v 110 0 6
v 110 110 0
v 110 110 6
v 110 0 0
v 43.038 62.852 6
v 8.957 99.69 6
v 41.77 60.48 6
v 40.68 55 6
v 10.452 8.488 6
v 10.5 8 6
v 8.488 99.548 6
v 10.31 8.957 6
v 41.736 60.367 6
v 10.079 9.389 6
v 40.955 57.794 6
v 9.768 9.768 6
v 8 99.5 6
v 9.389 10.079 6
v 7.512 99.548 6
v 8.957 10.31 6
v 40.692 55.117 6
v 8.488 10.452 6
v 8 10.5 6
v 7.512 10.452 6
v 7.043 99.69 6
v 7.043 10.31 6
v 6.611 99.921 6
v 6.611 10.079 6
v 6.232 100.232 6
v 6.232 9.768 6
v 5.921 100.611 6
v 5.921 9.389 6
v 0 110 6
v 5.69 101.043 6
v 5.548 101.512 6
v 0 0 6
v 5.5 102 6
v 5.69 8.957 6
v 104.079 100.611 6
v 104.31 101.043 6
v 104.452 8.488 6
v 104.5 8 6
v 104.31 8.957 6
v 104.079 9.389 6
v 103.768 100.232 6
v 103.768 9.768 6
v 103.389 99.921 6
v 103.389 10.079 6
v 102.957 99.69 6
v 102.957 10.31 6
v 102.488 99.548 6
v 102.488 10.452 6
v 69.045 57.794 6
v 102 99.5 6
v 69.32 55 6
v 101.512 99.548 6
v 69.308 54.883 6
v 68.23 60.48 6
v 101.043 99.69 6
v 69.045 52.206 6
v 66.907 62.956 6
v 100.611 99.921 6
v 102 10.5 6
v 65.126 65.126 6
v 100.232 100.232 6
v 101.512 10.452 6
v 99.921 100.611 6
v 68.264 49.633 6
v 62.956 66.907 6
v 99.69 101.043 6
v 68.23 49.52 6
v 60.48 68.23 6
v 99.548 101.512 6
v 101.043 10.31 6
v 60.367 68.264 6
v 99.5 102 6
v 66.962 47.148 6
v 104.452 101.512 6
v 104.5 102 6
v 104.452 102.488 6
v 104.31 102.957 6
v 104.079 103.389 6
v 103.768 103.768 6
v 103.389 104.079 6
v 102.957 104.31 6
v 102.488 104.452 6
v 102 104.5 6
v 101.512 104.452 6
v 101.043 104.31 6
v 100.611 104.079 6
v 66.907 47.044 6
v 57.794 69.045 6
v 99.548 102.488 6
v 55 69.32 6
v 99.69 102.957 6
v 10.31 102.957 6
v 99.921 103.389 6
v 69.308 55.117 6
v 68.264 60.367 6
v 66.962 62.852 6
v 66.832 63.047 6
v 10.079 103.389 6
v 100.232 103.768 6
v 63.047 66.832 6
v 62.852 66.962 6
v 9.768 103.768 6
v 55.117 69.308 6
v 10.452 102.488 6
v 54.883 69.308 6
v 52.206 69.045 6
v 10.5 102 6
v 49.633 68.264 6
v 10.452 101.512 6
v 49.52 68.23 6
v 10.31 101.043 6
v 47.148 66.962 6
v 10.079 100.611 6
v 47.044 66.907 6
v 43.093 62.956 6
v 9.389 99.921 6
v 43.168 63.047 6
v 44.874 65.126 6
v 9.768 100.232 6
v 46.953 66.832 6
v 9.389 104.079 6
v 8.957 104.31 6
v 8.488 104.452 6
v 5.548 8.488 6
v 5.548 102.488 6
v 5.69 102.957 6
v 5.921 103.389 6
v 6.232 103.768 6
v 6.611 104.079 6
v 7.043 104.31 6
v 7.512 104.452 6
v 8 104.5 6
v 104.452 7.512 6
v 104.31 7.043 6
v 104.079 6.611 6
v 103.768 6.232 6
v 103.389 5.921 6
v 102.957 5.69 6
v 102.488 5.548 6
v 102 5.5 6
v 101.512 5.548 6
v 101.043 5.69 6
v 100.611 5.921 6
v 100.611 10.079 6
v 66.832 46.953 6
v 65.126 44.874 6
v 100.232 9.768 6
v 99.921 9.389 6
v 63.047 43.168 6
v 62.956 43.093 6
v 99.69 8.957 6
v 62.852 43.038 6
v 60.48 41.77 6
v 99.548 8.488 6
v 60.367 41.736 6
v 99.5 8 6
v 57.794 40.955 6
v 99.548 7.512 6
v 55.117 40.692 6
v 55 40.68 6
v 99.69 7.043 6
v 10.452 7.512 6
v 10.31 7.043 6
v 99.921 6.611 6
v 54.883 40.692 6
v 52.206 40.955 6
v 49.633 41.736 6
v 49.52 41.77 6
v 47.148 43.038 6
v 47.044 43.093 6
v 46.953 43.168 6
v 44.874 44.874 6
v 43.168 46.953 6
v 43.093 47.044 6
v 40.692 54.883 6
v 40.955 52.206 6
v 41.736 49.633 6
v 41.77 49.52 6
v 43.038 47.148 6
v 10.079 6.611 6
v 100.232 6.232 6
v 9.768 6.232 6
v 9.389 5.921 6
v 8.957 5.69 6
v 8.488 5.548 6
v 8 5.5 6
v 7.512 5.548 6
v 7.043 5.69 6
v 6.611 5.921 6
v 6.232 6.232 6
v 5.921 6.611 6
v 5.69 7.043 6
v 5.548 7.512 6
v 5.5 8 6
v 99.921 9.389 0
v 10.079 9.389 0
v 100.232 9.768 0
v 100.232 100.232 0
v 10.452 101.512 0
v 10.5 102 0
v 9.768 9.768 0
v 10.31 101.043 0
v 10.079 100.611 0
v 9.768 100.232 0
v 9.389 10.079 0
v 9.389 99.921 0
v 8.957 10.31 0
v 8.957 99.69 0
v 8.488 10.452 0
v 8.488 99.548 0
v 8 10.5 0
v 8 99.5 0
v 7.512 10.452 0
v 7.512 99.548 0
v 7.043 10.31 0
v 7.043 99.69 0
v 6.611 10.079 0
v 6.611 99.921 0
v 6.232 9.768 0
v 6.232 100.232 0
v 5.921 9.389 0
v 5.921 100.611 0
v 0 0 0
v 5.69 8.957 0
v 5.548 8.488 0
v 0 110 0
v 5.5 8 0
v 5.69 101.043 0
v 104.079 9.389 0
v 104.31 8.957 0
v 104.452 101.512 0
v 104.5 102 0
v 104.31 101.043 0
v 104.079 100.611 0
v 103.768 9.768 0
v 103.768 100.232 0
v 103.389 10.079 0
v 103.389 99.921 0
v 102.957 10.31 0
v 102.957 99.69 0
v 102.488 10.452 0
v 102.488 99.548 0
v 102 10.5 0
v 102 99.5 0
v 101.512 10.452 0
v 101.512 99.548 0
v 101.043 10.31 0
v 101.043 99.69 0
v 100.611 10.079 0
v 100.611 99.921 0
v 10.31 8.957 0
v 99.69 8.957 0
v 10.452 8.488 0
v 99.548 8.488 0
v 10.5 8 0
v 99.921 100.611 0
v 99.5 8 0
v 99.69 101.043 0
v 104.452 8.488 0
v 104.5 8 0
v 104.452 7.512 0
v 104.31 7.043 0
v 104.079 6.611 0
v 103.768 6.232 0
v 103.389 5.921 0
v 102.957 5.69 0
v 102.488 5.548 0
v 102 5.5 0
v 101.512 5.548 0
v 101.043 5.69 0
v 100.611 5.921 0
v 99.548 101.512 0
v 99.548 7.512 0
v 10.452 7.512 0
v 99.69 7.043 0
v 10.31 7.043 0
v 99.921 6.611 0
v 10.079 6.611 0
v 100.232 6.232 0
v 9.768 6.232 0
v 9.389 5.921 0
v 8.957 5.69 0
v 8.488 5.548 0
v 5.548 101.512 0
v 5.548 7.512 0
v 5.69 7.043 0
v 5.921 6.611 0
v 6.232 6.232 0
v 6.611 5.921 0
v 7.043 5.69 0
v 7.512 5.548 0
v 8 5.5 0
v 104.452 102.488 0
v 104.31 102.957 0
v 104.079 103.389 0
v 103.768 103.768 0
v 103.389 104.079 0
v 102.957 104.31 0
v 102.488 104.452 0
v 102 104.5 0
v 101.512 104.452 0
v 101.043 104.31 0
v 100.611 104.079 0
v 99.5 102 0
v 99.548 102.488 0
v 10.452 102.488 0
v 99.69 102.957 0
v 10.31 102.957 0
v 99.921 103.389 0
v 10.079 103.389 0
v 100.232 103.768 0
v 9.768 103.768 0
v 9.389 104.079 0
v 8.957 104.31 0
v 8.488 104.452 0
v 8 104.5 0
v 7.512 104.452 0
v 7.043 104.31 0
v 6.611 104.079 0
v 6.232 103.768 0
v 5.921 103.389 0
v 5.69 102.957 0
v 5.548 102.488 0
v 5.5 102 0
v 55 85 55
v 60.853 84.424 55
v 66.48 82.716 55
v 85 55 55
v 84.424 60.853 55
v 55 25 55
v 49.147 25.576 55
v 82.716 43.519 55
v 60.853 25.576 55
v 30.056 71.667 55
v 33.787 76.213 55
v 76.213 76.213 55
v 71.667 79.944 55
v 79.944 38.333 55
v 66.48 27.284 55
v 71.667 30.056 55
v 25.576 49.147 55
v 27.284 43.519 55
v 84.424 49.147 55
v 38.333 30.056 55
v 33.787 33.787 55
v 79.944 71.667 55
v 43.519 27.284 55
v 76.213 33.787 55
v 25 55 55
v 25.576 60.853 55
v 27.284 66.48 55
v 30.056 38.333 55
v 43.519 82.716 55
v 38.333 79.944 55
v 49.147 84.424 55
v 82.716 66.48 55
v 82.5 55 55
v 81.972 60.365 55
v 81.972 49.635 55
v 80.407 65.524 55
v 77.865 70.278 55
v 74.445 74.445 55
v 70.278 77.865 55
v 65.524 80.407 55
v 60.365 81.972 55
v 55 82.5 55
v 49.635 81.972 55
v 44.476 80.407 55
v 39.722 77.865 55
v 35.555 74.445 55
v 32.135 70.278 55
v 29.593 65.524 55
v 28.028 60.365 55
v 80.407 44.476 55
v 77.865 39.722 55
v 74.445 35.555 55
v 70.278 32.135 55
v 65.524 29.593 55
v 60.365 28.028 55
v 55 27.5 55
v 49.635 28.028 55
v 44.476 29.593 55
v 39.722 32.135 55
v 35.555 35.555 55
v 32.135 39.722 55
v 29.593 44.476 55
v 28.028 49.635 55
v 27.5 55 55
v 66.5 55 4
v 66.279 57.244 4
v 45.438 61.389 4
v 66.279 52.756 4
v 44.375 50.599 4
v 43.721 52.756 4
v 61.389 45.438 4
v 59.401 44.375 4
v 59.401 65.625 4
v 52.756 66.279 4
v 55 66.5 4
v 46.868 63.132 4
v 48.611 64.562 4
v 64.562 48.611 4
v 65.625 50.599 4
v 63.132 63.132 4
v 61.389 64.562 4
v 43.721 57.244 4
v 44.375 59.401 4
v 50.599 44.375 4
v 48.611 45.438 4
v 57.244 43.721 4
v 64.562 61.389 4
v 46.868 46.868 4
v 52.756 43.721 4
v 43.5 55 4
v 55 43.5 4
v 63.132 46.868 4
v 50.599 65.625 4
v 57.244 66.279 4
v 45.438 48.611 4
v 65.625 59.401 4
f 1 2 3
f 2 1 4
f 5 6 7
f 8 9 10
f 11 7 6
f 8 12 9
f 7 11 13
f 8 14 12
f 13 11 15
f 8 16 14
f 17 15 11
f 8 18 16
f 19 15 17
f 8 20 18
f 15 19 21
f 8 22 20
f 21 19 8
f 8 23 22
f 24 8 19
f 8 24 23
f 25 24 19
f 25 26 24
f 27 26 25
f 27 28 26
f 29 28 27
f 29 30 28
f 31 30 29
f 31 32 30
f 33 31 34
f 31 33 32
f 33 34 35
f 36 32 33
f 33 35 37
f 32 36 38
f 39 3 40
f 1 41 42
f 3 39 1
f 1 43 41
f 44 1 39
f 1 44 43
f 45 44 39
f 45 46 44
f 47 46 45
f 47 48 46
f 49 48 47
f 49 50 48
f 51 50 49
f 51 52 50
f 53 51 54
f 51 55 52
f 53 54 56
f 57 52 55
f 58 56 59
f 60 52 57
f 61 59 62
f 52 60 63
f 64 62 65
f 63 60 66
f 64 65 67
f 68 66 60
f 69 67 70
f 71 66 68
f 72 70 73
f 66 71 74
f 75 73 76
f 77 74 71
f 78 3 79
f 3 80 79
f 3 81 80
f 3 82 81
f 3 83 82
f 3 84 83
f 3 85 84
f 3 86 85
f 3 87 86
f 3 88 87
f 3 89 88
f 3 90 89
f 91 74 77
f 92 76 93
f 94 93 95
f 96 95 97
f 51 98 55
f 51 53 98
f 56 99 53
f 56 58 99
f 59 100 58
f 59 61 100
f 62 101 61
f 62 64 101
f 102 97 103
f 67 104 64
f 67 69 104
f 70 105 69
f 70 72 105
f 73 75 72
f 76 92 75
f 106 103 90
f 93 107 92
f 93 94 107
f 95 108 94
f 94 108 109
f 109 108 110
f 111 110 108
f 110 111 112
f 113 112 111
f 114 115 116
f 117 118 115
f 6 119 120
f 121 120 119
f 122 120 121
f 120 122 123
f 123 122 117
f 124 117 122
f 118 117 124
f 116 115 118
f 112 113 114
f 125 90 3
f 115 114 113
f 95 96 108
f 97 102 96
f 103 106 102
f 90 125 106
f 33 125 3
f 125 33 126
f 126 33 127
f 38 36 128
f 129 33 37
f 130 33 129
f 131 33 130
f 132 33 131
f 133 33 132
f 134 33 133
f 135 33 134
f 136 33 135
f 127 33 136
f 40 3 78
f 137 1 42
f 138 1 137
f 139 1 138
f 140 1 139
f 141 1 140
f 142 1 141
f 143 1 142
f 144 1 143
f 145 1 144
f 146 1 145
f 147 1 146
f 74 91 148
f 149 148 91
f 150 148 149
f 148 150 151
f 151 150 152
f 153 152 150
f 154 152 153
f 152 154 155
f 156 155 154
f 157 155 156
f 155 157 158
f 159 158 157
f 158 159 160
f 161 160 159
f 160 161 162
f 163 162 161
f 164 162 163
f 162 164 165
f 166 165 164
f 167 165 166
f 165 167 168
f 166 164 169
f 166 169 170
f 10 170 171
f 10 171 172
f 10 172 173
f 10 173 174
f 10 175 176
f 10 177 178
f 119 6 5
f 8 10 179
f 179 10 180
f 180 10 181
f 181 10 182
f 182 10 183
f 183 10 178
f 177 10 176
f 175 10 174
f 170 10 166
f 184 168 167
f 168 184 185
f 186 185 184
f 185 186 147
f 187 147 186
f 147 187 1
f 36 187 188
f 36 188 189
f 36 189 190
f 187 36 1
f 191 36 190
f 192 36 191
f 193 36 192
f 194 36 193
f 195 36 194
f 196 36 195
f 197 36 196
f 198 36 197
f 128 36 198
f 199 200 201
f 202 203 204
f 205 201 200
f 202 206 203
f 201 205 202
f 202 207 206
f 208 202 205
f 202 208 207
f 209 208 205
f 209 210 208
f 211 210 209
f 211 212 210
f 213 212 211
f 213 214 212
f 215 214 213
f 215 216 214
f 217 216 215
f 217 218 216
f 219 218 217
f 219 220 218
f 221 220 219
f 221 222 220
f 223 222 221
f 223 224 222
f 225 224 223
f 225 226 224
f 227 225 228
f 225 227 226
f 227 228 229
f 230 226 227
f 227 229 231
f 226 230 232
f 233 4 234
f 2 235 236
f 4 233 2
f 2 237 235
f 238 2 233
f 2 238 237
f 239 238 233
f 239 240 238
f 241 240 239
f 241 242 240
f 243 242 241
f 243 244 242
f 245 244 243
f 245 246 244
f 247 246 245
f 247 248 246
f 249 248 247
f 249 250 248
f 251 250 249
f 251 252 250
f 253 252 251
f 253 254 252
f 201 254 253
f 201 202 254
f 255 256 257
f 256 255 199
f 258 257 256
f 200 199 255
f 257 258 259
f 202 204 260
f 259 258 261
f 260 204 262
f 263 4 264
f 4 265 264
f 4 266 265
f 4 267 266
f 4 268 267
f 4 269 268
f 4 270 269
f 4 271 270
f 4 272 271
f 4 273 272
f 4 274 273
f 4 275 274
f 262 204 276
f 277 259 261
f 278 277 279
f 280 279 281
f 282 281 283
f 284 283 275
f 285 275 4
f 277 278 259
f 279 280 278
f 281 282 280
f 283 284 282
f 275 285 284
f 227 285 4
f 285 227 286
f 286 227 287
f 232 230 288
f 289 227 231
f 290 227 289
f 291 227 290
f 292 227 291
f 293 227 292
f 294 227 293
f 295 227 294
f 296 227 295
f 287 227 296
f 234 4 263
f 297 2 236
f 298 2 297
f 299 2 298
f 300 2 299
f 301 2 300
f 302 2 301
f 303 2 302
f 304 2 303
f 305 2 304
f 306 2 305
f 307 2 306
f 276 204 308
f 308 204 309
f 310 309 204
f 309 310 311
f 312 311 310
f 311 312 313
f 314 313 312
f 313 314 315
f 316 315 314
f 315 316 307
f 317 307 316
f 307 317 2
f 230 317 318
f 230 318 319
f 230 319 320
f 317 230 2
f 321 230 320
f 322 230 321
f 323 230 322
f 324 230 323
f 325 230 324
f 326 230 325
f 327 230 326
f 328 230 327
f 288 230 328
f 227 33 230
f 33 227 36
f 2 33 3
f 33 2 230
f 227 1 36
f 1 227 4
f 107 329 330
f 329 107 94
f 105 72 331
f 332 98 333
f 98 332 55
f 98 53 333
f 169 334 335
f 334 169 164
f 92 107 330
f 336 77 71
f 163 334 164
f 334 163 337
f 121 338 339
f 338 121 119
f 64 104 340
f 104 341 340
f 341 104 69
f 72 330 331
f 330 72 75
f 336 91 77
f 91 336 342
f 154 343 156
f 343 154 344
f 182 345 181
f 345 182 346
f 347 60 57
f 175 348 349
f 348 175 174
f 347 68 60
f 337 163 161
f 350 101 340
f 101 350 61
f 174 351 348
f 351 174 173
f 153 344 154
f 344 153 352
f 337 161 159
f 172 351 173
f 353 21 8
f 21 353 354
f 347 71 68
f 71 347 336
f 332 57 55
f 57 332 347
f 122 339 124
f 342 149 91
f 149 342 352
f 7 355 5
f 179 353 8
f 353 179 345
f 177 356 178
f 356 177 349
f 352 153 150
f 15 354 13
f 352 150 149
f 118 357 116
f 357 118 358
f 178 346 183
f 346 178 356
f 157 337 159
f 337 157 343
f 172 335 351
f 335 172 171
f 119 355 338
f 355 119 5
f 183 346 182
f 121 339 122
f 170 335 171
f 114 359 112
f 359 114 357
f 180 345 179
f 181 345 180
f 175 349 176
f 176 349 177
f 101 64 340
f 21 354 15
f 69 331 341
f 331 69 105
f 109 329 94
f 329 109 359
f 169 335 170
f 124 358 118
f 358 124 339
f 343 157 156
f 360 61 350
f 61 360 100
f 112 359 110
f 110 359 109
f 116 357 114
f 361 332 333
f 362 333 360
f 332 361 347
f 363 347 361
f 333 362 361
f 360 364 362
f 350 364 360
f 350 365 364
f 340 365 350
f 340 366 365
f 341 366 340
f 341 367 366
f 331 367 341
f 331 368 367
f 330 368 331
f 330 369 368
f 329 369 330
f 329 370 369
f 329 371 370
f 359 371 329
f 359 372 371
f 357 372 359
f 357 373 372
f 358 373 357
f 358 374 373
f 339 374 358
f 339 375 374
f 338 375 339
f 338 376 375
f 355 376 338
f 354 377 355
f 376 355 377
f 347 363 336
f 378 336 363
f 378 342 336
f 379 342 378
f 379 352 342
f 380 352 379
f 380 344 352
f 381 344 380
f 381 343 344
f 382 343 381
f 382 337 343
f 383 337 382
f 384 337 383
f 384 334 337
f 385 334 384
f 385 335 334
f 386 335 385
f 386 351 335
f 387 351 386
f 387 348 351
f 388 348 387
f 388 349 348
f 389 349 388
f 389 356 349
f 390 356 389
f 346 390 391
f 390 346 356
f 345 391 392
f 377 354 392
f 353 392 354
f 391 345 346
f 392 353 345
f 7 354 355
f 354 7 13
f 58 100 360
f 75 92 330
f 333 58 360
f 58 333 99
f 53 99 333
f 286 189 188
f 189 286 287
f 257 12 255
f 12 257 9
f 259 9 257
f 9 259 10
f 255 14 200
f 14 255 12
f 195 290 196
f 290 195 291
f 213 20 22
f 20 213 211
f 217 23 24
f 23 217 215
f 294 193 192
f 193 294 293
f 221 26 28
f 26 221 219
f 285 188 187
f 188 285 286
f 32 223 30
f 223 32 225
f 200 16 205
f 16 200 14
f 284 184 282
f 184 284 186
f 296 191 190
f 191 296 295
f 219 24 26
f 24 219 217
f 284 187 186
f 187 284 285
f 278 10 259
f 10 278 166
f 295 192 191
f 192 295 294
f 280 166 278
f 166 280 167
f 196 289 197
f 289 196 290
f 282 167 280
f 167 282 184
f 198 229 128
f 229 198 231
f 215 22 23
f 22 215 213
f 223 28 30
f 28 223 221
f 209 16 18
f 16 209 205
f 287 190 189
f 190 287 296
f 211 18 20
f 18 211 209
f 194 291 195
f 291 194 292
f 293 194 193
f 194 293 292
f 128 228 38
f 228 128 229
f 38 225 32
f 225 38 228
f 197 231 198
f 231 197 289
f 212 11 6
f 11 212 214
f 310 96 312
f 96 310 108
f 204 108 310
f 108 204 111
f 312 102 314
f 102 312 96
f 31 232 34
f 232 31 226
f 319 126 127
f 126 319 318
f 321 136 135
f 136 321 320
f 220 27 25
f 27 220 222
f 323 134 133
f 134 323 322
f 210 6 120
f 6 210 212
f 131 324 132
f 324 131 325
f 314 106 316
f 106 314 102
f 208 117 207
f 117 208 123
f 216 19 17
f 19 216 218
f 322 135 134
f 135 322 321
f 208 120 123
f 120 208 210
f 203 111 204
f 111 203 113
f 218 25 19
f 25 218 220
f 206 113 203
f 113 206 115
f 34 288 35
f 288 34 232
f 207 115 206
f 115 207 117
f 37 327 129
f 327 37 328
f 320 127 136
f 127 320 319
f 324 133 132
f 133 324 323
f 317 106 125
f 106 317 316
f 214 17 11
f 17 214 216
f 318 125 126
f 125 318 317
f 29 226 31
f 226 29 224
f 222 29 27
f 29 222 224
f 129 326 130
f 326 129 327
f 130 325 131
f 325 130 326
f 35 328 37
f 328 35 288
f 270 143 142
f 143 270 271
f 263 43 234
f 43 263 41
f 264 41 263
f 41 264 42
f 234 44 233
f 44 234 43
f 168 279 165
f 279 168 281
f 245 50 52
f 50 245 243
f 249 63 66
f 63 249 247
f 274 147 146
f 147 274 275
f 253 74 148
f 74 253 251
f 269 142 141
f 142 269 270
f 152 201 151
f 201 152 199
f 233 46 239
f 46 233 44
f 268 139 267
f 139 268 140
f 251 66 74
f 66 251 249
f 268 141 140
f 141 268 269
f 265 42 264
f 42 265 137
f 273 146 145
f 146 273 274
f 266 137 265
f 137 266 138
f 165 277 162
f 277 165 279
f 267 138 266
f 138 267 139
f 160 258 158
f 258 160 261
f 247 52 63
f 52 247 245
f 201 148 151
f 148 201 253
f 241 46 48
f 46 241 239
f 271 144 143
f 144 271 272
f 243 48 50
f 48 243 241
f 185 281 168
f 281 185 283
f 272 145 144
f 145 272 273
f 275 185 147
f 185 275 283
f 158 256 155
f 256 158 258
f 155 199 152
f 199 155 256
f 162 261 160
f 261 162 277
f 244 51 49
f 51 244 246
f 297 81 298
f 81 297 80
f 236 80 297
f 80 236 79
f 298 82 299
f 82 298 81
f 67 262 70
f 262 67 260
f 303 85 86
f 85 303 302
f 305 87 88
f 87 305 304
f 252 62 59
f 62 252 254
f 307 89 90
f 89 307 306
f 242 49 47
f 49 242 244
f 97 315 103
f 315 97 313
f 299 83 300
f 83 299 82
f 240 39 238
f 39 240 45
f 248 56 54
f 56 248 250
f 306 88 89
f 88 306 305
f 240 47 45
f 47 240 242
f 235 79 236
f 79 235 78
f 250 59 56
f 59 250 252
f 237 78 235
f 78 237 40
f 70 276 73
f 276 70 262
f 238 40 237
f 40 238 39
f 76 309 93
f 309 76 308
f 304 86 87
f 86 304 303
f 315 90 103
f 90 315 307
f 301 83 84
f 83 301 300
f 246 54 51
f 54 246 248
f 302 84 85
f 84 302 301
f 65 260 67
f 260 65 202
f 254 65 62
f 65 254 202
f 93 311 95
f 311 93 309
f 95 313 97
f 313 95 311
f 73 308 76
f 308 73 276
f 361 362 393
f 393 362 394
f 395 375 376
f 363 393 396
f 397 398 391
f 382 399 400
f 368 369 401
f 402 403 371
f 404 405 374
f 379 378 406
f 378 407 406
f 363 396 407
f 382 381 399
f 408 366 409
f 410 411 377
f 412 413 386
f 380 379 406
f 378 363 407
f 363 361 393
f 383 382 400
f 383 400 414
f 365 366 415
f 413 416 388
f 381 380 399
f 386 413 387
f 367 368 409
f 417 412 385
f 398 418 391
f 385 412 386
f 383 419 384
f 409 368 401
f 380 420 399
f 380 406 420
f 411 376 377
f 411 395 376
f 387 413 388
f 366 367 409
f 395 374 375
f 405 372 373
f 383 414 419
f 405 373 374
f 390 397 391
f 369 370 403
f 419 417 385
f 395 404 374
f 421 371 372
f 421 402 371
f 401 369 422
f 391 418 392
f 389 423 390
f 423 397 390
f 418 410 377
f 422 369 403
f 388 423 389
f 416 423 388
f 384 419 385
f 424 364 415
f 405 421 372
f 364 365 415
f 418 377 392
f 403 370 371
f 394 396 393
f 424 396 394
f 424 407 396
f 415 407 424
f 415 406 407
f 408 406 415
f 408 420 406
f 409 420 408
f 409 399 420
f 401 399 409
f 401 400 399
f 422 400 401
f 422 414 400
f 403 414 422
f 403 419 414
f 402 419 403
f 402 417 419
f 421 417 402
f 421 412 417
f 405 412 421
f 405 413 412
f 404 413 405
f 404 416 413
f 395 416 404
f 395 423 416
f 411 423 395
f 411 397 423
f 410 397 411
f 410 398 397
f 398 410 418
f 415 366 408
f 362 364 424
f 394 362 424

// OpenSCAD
$fn = 32;

// ----------------------------------------------------------------------
// Hopper: flanged with square flange
// ----------------------------------------------------------------------

// --- parameters (mm) ---
fl = 110;                 // flange side, X and Y
fl_t = 6;                 // flange thickness
cone_h = 50;              // cone height above the flange
top_d = 60;               // cone mouth diameter
bot_d = 28;               // cone spout diameter
wall = 2.5;               // cone wall thickness
hole_r = 2.5;             // flange hole radius
hole_in = 8;              // hole inset from the corners

bore_d = bot_d - 2 * wall;  // spout bore diameter
total_h = fl_t + cone_h - 1;  // overall height

difference() {
  union() {
    cube([fl, fl, fl_t]);
    translate([fl / 2, fl / 2, fl_t - 1])
      cylinder(h = cone_h, d1 = bot_d, d2 = top_d);
  }
  translate([fl / 2, fl / 2, fl_t - 2])
    cylinder(h = cone_h + 1, d1 = bore_d, d2 = top_d - 2 * wall);
  for (sx = [0, 1], sy = [0, 1])
    translate([sx ? fl - hole_in : hole_in,
               sy ? fl - hole_in : hole_in, -1])
      cylinder(r = hole_r, h = fl_t + 2);
}
